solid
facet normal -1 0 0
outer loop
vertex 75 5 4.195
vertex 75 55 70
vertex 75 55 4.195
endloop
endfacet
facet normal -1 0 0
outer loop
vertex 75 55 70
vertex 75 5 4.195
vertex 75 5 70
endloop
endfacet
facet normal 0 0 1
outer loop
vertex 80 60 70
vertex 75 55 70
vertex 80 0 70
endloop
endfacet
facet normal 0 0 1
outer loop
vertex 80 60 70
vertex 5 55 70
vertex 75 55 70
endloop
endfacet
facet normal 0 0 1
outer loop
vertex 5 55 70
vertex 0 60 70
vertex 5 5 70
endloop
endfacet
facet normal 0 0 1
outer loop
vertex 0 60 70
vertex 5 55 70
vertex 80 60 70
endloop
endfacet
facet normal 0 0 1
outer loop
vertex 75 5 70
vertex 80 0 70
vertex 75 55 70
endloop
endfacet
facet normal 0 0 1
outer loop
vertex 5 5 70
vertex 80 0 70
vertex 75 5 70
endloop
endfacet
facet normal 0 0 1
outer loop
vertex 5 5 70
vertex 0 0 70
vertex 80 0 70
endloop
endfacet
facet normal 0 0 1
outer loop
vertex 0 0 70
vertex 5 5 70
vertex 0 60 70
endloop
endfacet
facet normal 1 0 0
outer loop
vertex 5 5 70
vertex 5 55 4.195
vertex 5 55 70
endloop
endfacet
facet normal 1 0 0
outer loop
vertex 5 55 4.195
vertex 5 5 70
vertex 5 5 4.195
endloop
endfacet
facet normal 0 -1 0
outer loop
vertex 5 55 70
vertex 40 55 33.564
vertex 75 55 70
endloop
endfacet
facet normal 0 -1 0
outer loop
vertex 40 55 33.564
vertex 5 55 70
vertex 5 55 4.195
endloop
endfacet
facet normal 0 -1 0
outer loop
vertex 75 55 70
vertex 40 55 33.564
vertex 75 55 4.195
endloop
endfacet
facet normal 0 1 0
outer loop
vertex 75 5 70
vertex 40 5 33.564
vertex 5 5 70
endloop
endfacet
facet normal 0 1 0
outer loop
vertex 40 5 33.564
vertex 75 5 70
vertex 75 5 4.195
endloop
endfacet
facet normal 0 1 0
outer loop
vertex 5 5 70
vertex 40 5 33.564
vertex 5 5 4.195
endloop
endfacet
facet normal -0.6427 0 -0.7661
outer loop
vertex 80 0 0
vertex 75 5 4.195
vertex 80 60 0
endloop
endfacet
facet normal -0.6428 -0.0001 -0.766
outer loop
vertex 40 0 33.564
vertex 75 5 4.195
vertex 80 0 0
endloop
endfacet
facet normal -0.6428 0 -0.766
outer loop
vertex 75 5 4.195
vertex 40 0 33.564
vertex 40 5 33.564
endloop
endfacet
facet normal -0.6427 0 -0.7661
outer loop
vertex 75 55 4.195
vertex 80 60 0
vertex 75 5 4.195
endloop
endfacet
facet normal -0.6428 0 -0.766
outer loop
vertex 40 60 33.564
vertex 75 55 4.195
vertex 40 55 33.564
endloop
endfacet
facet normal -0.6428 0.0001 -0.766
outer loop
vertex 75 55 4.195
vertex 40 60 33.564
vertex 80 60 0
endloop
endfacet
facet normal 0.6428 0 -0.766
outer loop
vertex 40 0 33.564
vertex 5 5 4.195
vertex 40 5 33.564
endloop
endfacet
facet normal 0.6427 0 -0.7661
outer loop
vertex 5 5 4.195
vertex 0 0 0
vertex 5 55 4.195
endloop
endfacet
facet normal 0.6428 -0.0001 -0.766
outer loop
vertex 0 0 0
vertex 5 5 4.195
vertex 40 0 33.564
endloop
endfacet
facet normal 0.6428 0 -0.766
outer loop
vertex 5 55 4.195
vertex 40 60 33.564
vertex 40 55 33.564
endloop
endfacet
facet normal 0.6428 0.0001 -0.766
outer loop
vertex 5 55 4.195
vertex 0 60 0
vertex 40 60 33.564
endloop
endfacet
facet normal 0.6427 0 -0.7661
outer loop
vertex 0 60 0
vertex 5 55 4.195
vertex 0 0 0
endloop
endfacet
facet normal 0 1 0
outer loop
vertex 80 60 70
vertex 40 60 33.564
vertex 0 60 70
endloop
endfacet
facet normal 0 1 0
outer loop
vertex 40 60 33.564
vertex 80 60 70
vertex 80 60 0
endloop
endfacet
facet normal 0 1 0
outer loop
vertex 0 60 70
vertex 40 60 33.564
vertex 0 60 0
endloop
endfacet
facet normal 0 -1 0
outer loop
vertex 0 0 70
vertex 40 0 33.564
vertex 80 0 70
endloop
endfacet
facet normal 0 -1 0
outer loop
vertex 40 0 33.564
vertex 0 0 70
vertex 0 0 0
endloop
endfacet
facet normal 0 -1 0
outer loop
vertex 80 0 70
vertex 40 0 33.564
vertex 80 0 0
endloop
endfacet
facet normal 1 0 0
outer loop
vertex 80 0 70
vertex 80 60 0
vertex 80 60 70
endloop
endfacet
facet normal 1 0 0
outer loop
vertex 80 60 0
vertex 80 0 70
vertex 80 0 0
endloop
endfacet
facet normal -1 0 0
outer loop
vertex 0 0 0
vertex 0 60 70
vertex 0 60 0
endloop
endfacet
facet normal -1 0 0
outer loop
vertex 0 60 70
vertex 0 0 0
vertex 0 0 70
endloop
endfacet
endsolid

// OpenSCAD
// height chimney (mm)
h=70; 

// width chimney (mm)
b=80; 

// depth chimney (mm)
t=60; 

// thickness chimney wall (mm)
d=5; 

// inclination of roof (in degrees)
a=40; // [0:89]


/* [Hidden] */
// sin a = h / c
// c = sqrt((b/2)^2+h^2)
// solve h=sin(a)*sqrt(b^2/4+h^2) for h
hroof = b * sin(a)/(2 *sqrt(1 - sin(a)*sin(a)));


difference() {
    // chimney
    cube([b, t, h]);

    union() {
        // inner cube to remove
        translate([d, d, 0])
        cube([b-2*d, t-2*d, h]);

        roof(b, t, hroof);
    }
}

module roof(b, t, h){
   polyhedron(
       points=[[0,0,0], [0,t,0], [b,t,0], [b,0,0], [b/2,0,h], [b/2,t,h]],
       faces=[[0,1,2,3],[5,4,3,2],[0,4,5,1],[1,5,2],[0,3,4]]
   );
}
